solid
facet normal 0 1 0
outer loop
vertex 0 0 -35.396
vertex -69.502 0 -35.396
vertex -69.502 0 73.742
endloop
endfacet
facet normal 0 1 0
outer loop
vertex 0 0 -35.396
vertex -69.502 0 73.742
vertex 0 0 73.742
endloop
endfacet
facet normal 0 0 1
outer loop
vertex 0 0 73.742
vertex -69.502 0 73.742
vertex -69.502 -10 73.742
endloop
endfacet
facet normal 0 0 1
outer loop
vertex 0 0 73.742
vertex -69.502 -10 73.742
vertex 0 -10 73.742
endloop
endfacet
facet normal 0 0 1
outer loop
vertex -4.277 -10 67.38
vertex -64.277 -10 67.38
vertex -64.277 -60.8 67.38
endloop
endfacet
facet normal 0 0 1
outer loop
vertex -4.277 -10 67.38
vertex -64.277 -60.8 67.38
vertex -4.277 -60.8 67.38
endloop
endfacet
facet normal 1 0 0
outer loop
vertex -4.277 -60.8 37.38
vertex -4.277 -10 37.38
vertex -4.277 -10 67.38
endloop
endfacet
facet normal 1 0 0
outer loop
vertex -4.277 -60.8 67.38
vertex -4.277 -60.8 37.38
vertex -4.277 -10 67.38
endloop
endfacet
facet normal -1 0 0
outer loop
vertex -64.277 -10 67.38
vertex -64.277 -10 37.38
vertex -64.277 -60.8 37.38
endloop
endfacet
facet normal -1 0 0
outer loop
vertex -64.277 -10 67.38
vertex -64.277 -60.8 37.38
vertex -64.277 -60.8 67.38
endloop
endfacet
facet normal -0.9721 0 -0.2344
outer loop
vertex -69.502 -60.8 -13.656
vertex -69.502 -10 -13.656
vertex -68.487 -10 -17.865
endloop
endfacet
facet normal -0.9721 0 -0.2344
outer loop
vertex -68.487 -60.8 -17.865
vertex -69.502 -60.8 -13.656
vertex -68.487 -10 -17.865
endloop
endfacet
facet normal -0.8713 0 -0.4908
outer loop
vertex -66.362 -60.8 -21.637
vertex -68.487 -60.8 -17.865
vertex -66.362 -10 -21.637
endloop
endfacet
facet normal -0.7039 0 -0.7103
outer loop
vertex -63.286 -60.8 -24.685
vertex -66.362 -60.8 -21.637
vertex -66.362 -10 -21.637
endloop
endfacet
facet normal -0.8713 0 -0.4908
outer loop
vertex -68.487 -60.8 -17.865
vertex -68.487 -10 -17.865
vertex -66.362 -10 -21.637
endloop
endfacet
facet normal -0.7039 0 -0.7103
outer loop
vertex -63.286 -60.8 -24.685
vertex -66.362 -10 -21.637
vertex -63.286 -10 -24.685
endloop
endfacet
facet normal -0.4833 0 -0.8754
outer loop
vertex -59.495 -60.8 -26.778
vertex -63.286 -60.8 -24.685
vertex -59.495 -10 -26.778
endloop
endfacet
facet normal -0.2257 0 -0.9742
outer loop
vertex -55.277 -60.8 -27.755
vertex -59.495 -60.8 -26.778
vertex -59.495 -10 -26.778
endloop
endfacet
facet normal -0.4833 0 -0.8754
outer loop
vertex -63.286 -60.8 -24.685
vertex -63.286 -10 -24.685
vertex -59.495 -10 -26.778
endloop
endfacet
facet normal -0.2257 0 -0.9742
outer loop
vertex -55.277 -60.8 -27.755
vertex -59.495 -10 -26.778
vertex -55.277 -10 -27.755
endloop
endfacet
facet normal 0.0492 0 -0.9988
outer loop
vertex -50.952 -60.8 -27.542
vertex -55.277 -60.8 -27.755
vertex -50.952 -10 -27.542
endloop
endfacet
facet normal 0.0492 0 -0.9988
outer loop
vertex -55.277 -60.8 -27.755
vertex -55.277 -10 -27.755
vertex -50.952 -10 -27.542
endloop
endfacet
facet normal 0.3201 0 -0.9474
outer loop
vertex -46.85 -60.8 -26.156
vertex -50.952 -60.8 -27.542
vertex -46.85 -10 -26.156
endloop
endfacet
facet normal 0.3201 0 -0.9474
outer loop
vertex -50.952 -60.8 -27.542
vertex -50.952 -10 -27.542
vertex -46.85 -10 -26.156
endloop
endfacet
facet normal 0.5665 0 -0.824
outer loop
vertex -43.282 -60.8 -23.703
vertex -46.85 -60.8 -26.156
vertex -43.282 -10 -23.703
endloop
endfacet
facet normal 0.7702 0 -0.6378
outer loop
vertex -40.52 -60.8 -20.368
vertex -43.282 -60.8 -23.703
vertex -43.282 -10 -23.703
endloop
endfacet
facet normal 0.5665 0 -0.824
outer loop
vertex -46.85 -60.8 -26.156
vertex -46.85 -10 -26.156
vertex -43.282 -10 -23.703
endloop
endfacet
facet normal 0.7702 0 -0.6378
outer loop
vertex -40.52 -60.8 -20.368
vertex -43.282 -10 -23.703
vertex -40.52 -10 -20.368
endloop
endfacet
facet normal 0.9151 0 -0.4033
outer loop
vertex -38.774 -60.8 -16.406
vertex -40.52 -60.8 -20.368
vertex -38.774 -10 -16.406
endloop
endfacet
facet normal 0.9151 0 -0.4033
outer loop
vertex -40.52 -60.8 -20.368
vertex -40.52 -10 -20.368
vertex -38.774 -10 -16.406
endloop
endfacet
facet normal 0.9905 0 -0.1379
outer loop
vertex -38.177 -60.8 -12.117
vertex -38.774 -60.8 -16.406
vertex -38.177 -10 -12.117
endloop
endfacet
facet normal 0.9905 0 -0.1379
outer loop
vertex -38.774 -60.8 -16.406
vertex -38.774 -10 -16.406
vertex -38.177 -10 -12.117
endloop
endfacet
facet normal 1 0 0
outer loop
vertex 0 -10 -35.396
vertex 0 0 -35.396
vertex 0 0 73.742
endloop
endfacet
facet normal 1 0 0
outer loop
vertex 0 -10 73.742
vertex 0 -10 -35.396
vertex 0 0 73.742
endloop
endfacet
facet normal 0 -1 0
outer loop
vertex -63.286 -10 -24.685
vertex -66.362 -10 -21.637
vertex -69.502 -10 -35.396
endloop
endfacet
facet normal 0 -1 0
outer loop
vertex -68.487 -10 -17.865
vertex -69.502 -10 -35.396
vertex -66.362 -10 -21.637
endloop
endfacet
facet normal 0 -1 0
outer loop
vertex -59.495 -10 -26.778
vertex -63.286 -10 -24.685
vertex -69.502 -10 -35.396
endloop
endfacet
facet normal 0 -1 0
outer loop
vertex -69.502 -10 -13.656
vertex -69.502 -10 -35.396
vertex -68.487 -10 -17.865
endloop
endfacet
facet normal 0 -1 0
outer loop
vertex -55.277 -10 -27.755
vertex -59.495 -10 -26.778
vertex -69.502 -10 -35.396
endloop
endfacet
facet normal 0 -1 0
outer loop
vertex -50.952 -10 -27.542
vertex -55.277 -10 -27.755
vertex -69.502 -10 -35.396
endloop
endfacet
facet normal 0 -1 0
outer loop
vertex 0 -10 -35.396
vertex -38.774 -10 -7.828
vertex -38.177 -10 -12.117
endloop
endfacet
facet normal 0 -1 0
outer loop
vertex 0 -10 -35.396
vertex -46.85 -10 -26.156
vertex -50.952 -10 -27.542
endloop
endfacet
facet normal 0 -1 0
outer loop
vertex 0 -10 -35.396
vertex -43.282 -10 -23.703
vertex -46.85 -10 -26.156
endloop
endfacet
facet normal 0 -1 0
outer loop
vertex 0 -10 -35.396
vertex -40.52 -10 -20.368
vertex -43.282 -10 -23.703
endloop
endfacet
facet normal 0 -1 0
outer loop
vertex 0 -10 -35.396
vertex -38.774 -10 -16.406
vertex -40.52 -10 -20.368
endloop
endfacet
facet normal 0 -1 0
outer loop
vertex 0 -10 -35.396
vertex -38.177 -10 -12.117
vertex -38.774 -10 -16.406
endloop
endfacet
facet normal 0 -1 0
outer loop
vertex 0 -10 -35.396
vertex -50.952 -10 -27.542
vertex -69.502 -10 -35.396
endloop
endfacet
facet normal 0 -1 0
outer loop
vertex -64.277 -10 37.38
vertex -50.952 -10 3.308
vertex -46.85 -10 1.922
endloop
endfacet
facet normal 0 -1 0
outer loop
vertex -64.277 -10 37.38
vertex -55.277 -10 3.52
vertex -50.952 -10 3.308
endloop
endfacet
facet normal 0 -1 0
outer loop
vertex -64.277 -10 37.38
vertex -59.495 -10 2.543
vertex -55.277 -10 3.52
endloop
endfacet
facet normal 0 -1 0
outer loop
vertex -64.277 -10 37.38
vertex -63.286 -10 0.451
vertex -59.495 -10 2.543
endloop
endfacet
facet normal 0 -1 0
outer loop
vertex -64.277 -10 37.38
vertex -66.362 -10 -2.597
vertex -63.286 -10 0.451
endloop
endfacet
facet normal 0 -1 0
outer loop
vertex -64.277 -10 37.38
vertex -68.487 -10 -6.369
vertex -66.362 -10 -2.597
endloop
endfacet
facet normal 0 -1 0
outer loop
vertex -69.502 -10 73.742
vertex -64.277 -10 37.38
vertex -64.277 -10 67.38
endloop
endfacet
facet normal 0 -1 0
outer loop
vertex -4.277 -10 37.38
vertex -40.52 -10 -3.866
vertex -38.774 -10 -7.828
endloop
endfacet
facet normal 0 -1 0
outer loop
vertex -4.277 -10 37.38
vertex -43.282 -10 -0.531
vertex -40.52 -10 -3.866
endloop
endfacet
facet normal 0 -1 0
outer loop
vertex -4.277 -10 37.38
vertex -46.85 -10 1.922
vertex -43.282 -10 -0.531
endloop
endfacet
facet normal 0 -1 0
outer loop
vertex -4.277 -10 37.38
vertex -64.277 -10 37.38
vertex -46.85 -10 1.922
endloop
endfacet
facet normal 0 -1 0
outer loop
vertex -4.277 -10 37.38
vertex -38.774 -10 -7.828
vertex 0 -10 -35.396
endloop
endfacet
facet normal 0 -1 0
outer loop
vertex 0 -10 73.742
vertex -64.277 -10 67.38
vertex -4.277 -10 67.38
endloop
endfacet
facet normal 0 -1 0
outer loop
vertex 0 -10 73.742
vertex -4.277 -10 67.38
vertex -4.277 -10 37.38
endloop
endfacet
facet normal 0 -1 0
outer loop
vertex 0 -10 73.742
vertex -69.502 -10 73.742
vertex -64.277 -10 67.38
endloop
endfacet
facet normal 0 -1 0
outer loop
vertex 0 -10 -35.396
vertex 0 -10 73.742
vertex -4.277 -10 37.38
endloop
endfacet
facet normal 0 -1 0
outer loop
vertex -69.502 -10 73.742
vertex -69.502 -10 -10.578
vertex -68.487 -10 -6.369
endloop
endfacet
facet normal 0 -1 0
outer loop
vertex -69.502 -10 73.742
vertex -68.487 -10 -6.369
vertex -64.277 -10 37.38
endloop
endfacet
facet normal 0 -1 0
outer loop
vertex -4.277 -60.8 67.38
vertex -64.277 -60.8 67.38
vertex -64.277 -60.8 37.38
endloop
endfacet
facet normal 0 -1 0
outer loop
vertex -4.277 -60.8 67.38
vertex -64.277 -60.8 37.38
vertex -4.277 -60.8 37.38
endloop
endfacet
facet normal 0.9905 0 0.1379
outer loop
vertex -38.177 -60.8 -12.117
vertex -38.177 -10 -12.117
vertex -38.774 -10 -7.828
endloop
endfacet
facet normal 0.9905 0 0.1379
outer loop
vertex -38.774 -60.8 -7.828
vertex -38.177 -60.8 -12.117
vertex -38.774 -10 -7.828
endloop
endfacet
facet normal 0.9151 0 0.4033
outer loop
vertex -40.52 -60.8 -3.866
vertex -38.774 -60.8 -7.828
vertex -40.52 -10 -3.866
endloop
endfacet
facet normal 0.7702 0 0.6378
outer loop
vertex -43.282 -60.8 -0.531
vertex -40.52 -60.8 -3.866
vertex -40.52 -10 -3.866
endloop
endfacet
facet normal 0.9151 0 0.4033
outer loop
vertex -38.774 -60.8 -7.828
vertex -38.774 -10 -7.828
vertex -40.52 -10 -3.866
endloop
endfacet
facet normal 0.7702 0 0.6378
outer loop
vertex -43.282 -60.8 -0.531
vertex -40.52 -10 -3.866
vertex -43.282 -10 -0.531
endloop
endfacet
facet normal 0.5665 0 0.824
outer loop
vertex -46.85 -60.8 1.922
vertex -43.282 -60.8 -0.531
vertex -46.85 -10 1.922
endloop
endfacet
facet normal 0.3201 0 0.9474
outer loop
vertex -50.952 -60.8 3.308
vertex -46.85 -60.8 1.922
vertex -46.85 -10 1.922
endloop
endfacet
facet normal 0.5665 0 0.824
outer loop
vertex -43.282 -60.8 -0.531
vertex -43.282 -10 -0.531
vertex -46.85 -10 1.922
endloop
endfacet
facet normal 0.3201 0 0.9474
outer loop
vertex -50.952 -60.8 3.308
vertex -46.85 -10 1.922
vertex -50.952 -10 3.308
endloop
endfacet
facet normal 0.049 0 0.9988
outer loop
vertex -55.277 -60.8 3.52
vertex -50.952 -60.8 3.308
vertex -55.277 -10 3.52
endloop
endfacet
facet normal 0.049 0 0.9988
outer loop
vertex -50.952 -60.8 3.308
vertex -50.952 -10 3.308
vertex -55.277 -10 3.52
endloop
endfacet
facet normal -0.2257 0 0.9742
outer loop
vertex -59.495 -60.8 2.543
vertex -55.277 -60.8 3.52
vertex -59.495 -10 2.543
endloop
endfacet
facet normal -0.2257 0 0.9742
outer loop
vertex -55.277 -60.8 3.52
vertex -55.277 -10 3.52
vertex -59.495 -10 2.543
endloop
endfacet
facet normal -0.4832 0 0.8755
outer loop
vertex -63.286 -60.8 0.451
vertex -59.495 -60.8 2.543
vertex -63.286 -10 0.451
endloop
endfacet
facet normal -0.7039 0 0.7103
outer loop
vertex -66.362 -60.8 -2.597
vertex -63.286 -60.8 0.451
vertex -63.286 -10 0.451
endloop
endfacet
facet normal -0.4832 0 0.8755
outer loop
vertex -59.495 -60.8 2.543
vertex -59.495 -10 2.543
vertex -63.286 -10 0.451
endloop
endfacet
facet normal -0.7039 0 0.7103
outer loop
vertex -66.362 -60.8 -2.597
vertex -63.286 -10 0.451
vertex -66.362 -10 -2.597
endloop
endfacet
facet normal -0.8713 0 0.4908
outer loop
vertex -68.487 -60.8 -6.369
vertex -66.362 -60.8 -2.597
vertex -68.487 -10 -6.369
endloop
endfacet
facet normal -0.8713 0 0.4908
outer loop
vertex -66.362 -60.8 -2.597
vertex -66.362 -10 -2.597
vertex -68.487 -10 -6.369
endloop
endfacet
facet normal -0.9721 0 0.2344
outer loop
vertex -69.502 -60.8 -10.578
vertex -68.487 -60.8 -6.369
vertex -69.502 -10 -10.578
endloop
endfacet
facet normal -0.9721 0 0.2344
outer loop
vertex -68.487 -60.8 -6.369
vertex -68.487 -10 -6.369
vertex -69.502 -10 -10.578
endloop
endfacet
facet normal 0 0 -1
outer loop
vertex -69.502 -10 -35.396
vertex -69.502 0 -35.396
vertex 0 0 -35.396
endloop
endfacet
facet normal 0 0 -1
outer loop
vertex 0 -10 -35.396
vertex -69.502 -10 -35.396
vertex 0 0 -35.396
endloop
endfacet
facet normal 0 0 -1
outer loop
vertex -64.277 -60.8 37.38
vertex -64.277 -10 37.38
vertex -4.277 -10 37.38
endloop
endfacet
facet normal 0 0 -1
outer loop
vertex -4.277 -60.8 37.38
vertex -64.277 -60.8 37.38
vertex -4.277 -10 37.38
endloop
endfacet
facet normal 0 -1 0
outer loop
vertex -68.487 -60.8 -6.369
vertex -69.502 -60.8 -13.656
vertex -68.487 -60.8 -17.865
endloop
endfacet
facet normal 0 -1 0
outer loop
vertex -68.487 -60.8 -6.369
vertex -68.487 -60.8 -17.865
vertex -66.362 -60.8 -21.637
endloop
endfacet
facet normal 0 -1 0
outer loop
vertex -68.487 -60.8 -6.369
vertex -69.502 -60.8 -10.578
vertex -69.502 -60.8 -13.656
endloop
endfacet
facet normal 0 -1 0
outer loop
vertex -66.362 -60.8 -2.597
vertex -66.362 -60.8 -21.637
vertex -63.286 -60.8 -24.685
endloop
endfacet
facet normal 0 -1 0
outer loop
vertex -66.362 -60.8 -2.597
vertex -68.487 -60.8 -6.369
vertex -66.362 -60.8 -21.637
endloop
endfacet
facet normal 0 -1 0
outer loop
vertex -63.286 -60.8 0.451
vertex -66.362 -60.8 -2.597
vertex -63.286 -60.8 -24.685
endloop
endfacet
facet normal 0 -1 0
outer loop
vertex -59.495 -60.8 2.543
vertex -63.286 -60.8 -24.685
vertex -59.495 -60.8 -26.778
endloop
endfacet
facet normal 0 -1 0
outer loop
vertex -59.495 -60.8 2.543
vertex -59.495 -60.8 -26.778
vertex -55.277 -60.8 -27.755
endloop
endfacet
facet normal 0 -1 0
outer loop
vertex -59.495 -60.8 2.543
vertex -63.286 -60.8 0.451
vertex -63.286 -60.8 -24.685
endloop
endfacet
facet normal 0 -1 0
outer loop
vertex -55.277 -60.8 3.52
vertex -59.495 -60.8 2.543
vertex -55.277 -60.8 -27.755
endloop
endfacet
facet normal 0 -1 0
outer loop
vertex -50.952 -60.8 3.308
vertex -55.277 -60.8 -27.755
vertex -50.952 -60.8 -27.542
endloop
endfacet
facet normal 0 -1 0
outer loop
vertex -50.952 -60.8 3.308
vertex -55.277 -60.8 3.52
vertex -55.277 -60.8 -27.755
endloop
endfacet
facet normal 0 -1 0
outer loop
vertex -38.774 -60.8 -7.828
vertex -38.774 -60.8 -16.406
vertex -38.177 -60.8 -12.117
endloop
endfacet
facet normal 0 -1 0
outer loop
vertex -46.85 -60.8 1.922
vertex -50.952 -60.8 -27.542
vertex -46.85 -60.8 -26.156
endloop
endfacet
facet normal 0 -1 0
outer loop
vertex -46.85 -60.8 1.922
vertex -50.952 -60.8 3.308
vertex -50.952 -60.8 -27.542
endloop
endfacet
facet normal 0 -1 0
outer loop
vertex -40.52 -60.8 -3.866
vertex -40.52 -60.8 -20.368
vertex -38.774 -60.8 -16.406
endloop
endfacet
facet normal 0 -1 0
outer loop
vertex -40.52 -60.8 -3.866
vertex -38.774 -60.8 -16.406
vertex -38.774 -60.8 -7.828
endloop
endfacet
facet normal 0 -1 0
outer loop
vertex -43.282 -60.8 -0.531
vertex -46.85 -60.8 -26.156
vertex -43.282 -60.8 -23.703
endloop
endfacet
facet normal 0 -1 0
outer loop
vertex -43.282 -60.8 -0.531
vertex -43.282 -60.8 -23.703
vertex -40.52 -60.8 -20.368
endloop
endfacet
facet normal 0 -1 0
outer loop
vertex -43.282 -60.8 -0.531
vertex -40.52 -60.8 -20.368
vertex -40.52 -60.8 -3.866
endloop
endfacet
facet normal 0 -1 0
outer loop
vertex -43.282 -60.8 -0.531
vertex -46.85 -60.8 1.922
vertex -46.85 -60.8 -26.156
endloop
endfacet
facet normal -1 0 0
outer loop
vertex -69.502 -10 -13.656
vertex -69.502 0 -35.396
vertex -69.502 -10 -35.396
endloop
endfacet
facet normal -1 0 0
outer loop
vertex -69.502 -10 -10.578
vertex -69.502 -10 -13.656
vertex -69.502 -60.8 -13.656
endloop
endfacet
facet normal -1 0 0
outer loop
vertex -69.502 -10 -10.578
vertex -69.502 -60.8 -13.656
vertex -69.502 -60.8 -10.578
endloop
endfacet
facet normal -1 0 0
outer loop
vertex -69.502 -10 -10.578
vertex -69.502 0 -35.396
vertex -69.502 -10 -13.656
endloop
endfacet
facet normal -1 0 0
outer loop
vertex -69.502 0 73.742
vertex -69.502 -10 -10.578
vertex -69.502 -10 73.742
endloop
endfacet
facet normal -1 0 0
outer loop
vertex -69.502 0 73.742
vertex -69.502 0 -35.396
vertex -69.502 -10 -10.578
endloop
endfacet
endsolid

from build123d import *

# Parameters (mm, degrees)
F0_W     = 69.50178
F0_H     = 109.138066
F1_DEPTH = 10
F2_W     = 60
F2_H     = 30
F4_DEPTH = 50.8
F5_DEPTH = 50.8


with BuildPart() as f1:
    # F0 (on Front) → F1 (new body)
    with BuildSketch(Plane.XZ):
        with Locations((-34.75089, 19.172902)):
            Rectangle(F0_W, F0_H)
    extrude(amount=F1_DEPTH)

    # F2 (on face) → F4 (join)
    with BuildSketch(Plane.XZ.offset(10)):
        with Locations((-34.276575, 52.379627)):
            Rectangle(F2_W, F2_H)
    extrude(amount=F4_DEPTH)

    # F3 (on face) → F5 (join)
    with BuildSketch(Plane.XZ.offset(10)):
        with BuildLine():
            ThreePointArc((-69.50178, -13.655613), (-53.107139, -27.798143), (-38.17735, -12.117047))
            ThreePointArc((-38.17735, -12.117047), (-53.107139, 3.564049), (-69.50178, -10.578481))
            Line((-69.50178, -10.578481), (-69.50178, -13.655613))
        make_face()
    extrude(amount=F5_DEPTH)


solid = f1.part
